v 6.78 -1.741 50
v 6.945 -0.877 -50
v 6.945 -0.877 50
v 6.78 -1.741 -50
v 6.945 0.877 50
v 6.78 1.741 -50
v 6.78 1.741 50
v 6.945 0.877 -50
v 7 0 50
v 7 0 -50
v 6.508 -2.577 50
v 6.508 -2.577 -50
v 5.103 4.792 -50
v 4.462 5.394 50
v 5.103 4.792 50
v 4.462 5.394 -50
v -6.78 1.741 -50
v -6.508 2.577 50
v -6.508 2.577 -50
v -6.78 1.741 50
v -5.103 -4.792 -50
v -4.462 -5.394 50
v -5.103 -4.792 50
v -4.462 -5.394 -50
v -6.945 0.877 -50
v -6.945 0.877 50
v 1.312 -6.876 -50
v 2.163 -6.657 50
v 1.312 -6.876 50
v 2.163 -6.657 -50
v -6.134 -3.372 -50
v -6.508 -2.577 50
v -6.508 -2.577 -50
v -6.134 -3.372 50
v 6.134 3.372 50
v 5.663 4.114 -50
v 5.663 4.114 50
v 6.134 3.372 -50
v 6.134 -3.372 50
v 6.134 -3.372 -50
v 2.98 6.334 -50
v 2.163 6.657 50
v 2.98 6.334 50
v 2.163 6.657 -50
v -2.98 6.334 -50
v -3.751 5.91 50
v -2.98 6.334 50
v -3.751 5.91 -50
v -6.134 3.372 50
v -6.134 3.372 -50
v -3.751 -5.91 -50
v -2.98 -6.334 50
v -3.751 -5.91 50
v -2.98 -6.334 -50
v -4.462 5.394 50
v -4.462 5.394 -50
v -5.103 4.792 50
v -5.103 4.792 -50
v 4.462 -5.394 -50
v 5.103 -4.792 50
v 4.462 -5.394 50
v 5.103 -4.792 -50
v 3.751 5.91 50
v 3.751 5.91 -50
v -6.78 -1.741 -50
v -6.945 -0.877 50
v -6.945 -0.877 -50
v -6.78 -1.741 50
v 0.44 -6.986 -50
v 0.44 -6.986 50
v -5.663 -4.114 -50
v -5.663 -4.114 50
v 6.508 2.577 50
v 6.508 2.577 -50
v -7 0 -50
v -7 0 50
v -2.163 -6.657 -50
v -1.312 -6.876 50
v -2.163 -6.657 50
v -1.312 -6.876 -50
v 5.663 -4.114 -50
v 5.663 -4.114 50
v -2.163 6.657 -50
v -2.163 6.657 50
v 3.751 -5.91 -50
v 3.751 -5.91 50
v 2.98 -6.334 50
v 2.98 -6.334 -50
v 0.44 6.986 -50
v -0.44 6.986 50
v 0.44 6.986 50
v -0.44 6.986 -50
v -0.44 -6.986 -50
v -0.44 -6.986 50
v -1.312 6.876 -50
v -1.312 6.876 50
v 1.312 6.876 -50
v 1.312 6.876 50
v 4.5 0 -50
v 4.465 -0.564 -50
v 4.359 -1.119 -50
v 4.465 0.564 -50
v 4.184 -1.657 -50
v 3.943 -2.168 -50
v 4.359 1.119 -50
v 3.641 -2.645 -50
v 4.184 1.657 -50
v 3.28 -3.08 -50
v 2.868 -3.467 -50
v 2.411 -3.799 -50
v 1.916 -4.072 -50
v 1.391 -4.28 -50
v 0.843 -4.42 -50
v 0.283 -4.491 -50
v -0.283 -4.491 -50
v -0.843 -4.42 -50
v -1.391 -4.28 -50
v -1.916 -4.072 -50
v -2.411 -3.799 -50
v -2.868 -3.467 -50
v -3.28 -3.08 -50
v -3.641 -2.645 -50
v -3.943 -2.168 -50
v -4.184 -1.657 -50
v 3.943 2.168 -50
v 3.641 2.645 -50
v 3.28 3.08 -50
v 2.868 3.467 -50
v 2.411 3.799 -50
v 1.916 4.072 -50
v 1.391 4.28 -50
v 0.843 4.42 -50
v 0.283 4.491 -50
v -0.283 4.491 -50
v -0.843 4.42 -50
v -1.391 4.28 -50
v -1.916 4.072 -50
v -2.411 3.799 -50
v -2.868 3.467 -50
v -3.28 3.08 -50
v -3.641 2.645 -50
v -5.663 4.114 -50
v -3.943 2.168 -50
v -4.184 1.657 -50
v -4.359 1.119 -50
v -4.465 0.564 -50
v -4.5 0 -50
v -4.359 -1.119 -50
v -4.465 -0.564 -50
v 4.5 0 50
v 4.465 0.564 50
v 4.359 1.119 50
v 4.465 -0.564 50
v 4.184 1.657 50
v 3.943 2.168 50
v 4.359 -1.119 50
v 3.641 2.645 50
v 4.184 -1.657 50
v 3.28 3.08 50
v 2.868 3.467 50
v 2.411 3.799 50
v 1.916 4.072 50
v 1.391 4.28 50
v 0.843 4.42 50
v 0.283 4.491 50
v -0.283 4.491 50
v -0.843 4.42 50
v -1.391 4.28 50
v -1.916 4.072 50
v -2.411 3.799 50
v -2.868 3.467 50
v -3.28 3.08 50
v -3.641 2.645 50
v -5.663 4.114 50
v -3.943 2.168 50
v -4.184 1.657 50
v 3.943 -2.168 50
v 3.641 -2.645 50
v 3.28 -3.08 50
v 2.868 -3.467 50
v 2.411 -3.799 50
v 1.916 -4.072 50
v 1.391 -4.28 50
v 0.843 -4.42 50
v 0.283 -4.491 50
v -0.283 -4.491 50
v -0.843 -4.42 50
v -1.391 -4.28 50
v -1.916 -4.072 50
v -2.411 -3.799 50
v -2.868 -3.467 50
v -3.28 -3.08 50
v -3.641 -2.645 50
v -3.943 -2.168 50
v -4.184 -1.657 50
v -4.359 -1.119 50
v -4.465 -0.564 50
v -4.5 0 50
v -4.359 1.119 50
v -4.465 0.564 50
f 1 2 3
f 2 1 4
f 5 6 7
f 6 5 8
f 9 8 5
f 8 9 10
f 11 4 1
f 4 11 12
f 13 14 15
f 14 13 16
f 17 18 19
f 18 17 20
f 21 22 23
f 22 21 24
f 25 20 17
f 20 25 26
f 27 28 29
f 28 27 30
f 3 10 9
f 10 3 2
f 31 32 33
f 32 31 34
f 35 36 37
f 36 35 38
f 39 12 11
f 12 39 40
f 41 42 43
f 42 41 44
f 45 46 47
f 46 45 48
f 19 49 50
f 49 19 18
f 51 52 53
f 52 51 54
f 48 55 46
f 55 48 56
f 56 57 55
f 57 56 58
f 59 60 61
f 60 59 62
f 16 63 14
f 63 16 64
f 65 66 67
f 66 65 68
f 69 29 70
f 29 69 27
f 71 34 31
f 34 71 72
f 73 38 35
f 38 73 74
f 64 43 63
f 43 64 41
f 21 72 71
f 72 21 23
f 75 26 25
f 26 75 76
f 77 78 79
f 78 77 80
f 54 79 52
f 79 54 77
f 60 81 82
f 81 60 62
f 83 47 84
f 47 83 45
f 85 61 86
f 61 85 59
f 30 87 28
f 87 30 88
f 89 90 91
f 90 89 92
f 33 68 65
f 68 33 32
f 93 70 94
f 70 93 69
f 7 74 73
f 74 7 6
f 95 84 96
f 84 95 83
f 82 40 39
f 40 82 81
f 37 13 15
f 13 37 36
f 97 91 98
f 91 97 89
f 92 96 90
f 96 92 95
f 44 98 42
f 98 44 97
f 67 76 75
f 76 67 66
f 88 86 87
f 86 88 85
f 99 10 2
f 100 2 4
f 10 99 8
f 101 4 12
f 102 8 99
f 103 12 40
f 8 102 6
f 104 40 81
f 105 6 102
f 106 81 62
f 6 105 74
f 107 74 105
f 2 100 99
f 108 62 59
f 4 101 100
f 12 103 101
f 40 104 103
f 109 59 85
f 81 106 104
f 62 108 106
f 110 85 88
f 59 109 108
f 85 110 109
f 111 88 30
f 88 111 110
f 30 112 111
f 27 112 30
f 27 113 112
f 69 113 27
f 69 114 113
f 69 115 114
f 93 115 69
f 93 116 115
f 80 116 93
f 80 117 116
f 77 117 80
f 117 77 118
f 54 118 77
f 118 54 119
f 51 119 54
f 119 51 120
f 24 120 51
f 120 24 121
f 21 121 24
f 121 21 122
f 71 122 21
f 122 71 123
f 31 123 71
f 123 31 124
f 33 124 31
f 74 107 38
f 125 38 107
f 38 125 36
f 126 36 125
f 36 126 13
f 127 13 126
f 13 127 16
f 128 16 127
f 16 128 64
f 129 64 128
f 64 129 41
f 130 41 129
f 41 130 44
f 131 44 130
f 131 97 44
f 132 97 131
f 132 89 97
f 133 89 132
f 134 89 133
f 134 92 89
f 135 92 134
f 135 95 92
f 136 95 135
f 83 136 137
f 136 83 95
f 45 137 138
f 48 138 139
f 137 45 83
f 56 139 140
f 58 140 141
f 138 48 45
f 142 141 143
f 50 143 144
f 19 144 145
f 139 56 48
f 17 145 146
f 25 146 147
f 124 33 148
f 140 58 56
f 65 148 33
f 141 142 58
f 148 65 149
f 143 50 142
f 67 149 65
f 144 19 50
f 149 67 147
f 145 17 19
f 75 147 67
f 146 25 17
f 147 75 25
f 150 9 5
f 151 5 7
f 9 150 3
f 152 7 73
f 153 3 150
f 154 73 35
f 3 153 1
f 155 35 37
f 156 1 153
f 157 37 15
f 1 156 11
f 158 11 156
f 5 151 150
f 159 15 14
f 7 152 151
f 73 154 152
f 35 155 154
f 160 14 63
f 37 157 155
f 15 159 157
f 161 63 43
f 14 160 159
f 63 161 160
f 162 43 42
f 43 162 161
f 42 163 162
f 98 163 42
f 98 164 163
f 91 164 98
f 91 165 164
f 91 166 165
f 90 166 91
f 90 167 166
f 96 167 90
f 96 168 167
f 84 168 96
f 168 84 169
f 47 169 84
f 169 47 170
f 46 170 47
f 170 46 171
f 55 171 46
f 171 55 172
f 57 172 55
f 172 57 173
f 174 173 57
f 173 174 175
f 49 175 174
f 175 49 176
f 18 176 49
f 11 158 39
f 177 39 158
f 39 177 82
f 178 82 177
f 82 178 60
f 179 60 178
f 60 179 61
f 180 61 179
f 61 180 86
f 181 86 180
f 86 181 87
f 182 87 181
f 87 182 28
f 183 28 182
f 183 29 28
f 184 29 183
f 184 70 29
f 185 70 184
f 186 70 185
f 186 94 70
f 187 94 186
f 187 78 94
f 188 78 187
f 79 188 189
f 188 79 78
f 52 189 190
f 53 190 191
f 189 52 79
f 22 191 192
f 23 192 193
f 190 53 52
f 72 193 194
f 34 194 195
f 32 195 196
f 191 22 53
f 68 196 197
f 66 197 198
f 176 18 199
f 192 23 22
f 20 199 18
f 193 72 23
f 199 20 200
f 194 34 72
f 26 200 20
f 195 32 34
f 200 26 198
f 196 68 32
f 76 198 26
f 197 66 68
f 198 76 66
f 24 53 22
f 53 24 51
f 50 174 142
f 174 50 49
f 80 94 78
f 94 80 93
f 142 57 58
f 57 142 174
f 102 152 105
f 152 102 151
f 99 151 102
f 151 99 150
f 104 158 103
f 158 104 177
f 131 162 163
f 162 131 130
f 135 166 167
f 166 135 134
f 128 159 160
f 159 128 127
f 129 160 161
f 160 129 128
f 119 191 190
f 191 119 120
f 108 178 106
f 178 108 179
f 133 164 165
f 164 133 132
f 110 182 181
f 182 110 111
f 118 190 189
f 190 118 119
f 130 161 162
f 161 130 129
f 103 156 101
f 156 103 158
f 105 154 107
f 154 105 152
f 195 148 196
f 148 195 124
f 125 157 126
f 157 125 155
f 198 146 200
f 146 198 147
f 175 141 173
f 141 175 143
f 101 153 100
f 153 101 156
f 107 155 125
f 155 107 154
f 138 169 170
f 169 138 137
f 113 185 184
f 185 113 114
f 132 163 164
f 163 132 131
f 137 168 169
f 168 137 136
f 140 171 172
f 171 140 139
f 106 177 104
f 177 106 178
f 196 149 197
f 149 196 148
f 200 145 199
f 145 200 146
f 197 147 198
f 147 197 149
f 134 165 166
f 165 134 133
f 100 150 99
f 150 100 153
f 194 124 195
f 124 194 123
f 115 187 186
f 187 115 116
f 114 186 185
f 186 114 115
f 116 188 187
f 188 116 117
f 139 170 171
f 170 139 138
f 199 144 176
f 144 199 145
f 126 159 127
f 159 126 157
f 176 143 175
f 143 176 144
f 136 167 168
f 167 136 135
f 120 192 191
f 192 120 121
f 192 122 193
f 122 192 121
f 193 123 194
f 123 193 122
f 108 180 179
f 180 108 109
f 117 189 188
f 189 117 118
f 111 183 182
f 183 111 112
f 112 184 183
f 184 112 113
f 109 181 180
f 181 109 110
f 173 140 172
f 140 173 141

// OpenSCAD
$fn = 50;


difference() {
	union() {
		translate(v = [0, 0, -50.0000000000]) {
			cylinder(h = 100, r = 7.0000000000);
		}
	}
	union() {
		translate(v = [0, 0, -100.0000000000]) {
			cylinder(h = 200, r = 4.5000000000);
		}
	}
}
